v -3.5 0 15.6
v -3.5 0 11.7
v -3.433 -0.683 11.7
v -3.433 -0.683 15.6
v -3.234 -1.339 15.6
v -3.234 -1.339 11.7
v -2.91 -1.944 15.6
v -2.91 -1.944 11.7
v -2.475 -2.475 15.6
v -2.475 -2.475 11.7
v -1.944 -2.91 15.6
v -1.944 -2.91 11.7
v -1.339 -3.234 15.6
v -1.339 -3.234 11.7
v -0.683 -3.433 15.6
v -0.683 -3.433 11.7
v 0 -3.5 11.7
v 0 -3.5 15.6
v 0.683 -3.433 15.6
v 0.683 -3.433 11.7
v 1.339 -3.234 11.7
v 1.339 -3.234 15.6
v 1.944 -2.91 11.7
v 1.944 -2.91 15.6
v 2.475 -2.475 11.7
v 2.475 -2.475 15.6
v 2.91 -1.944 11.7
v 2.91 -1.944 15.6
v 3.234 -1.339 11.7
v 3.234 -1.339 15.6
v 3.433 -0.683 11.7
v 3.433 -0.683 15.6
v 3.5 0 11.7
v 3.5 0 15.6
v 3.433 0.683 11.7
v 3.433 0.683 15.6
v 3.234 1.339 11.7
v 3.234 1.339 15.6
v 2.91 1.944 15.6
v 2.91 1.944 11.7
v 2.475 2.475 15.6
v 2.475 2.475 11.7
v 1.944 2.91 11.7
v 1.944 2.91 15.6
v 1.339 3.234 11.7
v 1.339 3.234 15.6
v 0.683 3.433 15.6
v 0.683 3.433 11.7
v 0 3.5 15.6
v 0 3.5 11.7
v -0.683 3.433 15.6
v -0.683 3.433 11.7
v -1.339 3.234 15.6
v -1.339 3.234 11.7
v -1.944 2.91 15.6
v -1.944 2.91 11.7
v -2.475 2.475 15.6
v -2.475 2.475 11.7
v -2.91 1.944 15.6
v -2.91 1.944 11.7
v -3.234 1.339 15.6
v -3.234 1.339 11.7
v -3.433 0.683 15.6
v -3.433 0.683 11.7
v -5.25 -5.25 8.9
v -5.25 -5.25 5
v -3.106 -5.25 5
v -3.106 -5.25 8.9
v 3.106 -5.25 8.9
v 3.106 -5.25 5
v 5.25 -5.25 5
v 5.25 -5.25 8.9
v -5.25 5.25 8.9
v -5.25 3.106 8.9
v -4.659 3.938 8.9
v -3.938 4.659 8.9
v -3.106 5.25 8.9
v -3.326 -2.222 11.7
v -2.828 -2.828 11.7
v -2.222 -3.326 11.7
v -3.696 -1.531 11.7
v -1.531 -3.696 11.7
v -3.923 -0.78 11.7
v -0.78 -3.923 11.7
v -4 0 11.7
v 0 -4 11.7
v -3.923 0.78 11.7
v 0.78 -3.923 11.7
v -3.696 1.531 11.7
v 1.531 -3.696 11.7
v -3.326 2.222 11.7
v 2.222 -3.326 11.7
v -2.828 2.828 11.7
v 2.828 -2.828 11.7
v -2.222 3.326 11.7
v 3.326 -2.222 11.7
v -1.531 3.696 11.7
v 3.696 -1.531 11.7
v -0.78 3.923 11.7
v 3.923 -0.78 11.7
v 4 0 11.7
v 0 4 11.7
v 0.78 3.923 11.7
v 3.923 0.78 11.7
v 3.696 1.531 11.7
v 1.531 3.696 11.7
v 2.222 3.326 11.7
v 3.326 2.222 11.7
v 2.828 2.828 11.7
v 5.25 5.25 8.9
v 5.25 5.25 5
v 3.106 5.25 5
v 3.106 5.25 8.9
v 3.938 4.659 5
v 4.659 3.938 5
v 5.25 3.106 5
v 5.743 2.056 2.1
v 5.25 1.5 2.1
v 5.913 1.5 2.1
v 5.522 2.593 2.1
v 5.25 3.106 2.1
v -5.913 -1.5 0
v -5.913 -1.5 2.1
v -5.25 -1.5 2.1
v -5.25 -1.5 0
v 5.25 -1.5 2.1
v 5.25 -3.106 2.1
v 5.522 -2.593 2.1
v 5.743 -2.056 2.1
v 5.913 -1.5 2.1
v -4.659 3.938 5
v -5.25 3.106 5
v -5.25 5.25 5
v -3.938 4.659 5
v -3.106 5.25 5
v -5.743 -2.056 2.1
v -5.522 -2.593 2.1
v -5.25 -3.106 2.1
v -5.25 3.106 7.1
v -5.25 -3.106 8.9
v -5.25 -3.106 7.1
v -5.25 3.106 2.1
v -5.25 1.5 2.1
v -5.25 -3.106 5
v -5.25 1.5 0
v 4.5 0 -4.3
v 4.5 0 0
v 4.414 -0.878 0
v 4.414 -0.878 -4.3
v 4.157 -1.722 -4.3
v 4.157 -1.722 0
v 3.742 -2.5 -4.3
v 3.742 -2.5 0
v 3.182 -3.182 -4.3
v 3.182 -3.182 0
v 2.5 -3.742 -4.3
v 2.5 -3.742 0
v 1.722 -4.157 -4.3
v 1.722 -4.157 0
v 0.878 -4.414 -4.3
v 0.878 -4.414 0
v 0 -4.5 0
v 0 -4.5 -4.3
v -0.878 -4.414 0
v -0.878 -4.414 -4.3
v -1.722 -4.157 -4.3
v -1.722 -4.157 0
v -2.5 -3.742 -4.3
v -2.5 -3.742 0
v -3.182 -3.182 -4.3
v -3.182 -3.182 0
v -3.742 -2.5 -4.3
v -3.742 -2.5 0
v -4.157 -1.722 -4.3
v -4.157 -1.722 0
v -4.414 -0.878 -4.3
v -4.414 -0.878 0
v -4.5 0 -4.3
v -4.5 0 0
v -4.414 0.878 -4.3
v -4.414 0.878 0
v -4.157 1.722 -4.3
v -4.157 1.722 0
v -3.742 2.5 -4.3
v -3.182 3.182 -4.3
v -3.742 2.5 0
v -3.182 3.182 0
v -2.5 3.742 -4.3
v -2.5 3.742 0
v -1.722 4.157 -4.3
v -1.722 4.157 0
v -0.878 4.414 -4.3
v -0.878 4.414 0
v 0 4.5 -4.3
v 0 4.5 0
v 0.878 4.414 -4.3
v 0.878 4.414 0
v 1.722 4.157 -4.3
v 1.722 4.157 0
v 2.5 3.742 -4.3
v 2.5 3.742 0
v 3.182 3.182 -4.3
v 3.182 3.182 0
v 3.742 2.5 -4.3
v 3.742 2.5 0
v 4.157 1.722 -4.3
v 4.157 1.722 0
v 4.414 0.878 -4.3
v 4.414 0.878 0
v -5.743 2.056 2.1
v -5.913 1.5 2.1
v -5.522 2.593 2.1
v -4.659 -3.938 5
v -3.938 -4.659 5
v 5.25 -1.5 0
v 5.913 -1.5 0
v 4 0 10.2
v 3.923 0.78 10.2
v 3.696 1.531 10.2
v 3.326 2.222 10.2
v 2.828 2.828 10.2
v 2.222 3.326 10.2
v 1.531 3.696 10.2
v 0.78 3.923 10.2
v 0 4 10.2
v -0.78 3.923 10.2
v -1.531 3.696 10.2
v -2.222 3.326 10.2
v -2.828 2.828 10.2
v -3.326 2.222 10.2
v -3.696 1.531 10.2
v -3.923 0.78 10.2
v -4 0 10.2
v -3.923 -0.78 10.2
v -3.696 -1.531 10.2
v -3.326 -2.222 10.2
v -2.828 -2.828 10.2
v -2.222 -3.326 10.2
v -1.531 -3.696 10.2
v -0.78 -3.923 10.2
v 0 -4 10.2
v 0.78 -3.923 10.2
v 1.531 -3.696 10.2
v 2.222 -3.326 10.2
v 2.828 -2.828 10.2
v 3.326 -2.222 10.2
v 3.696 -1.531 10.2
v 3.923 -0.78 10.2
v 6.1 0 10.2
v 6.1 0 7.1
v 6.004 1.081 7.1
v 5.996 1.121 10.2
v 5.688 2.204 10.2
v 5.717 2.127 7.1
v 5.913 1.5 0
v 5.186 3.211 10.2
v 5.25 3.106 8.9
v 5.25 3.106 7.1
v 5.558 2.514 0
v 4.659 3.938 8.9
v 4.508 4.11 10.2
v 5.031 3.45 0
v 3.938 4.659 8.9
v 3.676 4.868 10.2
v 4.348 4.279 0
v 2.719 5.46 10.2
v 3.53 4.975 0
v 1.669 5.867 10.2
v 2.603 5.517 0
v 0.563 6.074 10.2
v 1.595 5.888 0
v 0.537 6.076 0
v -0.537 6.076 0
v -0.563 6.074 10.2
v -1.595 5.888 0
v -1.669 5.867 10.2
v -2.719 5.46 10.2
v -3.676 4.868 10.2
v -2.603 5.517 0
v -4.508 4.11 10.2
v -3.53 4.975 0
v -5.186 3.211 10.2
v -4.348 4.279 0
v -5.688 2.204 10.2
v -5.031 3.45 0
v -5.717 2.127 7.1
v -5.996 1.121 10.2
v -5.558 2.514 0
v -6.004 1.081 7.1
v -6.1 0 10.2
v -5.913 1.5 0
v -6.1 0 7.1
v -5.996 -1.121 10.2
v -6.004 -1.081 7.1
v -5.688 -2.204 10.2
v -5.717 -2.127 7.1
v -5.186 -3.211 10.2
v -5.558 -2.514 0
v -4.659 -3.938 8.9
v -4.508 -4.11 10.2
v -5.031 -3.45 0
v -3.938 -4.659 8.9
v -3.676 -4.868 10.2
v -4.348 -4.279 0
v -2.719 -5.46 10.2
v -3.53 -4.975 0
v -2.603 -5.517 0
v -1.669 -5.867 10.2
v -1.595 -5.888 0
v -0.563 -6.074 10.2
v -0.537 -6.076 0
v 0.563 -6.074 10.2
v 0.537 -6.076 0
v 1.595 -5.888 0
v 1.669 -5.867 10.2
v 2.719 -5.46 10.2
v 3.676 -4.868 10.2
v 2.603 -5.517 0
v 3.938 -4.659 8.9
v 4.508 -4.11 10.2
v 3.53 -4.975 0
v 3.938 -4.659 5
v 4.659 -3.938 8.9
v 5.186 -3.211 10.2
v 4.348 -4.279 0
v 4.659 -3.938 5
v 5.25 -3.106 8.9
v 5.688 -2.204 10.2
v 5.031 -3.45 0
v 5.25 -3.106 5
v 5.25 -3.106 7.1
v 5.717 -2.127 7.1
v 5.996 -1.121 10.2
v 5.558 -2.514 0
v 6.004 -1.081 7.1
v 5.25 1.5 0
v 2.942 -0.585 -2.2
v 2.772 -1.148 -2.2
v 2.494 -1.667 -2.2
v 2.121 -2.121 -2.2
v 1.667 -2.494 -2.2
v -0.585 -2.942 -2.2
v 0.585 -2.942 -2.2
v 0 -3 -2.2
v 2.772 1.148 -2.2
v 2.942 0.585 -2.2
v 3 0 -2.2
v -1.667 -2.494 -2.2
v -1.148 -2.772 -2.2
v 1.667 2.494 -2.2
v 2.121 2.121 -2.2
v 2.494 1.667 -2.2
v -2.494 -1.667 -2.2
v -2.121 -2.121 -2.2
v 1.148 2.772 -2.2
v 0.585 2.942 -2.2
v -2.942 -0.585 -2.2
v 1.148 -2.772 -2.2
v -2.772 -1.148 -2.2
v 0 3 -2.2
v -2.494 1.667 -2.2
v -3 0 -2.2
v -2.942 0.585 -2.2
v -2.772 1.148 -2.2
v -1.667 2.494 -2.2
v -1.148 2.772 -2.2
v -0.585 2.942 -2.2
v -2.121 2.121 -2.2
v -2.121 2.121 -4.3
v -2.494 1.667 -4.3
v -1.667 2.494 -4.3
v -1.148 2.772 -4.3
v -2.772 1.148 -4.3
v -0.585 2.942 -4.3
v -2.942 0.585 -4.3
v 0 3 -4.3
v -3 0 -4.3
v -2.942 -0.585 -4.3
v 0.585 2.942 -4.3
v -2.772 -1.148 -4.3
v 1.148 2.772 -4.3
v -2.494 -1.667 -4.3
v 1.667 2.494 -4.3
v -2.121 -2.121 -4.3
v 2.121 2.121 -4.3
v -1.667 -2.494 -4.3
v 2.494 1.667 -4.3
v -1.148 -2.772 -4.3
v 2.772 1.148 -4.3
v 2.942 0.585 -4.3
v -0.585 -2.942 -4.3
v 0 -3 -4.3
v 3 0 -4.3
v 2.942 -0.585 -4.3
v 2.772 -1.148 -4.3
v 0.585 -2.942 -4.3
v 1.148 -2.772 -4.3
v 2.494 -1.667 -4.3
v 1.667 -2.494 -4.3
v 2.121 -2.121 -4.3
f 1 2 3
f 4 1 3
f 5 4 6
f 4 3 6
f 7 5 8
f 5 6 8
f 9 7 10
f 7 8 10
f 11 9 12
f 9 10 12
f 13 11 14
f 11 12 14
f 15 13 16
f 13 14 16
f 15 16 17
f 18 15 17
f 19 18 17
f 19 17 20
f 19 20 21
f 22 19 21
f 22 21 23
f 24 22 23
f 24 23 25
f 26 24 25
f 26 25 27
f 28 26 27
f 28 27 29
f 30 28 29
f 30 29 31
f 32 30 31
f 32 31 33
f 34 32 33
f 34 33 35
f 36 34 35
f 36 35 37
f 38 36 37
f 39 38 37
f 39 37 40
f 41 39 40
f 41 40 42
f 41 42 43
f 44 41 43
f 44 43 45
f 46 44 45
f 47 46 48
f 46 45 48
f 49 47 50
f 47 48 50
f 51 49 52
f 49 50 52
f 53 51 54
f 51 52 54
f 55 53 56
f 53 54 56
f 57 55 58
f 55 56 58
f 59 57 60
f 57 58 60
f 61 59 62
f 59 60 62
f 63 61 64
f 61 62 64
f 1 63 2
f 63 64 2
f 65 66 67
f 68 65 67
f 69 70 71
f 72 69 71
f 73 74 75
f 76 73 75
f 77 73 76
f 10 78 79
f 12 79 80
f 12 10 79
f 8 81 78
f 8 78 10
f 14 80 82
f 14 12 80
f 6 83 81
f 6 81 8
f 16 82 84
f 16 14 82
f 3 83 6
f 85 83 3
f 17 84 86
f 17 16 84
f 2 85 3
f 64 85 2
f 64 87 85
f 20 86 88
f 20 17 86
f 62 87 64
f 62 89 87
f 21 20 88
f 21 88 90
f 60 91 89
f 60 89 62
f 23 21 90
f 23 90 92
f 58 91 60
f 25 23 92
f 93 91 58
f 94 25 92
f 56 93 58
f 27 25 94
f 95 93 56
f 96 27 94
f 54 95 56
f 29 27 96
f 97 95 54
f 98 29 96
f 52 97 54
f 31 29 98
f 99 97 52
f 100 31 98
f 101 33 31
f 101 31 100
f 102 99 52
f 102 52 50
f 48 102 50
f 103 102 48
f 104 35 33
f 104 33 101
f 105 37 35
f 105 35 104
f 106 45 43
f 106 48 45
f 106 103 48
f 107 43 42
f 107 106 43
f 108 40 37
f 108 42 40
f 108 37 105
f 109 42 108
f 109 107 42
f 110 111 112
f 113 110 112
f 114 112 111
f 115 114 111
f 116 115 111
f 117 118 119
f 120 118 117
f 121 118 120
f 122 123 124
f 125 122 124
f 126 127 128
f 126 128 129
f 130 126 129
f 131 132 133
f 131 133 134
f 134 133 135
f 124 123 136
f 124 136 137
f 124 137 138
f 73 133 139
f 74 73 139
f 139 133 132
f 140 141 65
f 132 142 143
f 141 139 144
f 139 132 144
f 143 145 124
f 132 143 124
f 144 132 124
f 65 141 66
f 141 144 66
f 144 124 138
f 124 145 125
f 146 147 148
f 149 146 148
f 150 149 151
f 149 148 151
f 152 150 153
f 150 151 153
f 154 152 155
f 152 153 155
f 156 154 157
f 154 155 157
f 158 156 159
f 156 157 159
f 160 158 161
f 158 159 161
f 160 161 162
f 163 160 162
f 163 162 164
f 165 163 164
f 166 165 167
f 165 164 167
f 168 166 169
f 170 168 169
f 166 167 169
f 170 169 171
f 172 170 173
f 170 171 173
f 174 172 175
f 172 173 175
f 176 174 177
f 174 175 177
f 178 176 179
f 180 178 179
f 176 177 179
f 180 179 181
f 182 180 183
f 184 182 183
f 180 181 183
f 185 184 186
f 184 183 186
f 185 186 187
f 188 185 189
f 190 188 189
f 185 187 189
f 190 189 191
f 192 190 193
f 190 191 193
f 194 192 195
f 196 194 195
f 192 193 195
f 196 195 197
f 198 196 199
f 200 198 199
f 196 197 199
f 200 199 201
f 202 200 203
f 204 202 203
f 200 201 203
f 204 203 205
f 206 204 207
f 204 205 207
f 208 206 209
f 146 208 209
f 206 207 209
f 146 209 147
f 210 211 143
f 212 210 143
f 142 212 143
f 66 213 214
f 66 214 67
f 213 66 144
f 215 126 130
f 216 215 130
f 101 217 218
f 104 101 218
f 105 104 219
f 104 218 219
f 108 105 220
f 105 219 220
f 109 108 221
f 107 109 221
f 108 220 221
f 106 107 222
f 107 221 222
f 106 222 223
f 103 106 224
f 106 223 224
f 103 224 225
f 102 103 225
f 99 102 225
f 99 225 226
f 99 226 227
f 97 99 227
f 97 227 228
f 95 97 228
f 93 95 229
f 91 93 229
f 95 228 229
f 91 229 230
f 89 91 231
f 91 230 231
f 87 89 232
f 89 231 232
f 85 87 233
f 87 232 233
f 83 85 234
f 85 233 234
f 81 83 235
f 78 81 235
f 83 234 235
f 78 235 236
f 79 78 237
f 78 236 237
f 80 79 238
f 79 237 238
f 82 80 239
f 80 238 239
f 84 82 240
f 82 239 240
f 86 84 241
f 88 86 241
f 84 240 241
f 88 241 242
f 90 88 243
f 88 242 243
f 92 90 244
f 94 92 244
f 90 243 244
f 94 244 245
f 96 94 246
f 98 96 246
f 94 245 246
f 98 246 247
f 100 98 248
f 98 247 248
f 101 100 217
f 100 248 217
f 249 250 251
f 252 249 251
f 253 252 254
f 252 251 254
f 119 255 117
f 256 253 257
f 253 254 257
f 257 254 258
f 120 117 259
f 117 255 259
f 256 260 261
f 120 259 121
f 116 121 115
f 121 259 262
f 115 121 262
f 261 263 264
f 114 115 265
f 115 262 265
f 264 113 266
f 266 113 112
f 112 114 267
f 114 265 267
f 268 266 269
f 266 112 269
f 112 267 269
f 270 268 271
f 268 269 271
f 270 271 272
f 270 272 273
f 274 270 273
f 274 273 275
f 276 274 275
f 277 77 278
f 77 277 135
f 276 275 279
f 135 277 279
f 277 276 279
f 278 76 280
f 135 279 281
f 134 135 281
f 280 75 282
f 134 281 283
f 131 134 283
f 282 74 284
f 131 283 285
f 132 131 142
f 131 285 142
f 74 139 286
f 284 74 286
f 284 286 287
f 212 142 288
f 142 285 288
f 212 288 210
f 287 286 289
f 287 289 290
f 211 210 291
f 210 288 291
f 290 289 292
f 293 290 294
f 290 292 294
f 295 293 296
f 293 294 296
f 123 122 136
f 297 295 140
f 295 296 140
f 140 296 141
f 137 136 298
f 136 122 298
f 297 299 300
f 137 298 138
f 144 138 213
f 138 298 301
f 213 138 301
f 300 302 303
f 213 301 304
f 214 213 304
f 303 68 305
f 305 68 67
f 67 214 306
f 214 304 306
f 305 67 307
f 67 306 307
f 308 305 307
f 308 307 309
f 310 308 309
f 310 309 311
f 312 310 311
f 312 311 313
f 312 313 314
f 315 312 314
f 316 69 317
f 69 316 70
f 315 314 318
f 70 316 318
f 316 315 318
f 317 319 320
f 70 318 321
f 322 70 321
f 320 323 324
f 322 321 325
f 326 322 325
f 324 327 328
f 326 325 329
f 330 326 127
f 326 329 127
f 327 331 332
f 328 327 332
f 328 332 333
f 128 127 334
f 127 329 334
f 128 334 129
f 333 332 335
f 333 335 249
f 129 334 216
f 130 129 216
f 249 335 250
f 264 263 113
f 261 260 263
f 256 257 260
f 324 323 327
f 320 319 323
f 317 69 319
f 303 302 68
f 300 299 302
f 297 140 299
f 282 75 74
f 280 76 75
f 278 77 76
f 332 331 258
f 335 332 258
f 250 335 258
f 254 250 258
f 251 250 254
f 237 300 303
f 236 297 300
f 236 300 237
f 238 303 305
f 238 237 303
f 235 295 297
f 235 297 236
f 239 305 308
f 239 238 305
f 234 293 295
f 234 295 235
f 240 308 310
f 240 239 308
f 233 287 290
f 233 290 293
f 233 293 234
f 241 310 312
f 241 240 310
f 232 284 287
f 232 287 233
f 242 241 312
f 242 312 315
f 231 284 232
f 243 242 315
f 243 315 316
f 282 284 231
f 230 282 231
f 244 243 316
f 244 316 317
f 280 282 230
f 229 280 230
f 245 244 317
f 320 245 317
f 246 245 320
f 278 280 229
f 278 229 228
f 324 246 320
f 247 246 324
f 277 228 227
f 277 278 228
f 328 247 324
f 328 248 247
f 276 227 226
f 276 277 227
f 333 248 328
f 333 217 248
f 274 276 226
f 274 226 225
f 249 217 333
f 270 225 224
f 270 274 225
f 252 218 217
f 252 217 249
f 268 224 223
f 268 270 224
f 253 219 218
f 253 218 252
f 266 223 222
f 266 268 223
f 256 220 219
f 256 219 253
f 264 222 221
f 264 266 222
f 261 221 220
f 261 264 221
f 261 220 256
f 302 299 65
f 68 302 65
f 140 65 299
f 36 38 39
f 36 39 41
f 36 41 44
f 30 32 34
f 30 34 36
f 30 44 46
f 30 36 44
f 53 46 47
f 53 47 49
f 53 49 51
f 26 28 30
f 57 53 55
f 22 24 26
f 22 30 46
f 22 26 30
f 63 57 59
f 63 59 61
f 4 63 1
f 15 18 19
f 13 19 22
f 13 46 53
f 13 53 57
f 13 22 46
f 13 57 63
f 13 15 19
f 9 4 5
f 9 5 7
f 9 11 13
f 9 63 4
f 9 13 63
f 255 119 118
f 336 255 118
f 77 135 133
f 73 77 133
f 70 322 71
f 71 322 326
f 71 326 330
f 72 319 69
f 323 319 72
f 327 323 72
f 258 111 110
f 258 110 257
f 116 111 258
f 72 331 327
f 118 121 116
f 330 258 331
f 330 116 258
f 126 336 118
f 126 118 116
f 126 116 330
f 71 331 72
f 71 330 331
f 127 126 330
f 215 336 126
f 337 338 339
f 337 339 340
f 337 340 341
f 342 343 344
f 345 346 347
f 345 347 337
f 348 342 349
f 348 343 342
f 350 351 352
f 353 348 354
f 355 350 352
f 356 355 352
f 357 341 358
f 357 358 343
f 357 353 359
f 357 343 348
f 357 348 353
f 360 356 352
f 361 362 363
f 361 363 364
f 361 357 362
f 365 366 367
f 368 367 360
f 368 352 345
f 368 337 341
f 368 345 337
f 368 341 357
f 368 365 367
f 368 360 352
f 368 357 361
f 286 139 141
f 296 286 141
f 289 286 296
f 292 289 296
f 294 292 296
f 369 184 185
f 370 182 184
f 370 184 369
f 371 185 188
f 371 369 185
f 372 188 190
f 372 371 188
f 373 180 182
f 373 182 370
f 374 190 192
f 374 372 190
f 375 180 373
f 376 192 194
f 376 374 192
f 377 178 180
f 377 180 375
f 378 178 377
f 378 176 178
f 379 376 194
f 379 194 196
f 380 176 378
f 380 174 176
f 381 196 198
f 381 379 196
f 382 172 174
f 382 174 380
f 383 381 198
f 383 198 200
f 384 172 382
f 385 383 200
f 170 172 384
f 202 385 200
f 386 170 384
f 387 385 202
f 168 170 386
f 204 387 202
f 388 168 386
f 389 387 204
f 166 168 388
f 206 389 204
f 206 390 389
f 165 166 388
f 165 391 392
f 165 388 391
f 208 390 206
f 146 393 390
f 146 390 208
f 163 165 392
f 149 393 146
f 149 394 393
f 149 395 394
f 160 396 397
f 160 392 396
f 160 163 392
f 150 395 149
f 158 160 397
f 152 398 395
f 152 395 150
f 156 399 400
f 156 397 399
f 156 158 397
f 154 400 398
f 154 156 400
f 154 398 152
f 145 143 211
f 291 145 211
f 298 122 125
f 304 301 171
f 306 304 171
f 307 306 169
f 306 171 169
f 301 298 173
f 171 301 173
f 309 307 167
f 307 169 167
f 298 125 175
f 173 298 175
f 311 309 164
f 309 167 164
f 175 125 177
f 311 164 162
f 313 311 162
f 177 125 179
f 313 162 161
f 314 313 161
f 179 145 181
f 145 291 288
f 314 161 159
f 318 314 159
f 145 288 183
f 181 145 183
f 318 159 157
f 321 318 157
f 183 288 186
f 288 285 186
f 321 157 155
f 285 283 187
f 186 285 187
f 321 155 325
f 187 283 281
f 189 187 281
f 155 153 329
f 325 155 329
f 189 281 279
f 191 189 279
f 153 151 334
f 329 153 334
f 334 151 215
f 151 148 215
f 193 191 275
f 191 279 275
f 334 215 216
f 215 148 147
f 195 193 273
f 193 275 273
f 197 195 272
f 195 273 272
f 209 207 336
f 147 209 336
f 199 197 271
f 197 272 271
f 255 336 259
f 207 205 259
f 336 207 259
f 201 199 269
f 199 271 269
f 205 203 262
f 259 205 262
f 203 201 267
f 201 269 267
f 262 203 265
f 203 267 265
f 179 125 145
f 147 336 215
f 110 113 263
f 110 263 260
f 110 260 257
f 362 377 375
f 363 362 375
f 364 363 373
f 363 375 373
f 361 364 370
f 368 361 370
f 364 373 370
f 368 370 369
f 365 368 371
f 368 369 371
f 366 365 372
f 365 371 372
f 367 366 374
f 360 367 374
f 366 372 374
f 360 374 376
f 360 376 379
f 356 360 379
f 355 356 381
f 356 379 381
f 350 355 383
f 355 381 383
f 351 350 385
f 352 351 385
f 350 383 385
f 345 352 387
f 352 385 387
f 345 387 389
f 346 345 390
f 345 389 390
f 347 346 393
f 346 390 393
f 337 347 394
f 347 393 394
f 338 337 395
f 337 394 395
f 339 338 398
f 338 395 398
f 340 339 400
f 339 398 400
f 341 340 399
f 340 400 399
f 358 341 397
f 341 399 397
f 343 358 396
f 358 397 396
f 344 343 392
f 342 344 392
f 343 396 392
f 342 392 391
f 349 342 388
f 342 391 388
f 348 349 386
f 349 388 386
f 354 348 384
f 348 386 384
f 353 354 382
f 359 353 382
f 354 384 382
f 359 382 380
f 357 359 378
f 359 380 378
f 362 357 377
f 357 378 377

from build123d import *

# Parameters (mm, degrees)
SKETCH_1_R          = 6.1
EXTRUDE_1_DEPTH     = 10.2
EXTRUDE_START       = 8.9
SKETCH_1_5_W        = 10.5
SKETCH_1_5_H        = 10.5
EXTRUDE_2_DEPTH     = 3.9
CUT_EXTRUDE_START   = 2.1
CUT_EXTRUDE_1_DEPTH = 5
SKETCH_3_W          = 5.6626982
SKETCH_3_H          = 3
CUT_EXTRUDE_2_DEPTH = 12.83342723
SKETCH_4_R          = 4.5
EXTRUDE_3_DEPTH     = 4.3
SKETCH_5_R          = 3
CUT_EXTRUDE_3_DEPTH = 2.1
SKETCH_6_R          = 4
SKETCH_6_R_2        = 3.5
EXTRUDE_4_DEPTH     = 1.5
SKETCH_6_2_R        = 3.5
EXTRUDE_5_DEPTH     = 5.4


with BuildPart() as part:
    # 草图1 → 凸台-拉伸1 (new body)
    with BuildSketch(Plane.XY):
        Circle(SKETCH_1_R)
    extrude(amount=EXTRUDE_1_DEPTH)

    # 草图1<5> → 凸台-拉伸2 (add)
    with BuildSketch(Plane.XY.offset(EXTRUDE_START)):
        Rectangle(SKETCH_1_5_W, SKETCH_1_5_H)
    extrude(amount=-EXTRUDE_2_DEPTH)

    # 草图1<6> → 切除-拉伸1 (cut)
    with BuildSketch(Plane.XY.offset(CUT_EXTRUDE_START)):
        with BuildLine():
            ThreePointArc((-5.25, 3.106042498), (-6.1, 0), (-5.25, -3.106042498))
            Line((-5.25, -3.106042498), (-5.25, 3.106042498))
        make_face()
        with BuildLine():
            Line((5.25, 3.106042498), (5.25, -3.106042498))
            ThreePointArc((5.25, -3.106042498), (6.1, 0), (5.25, 3.106042498))
        make_face()
    extrude(amount=CUT_EXTRUDE_1_DEPTH, mode=Mode.SUBTRACT)

    # 草图3 → 切除-拉伸2 (cut, through all)
    with BuildSketch(Plane.XY.offset(2.1)):
        with BuildLine():
            Line((5.9126982, 1.5), (5.25, 1.5))
            Line((5.25, 1.5), (5.25, -1.5))
            Line((5.25, -1.5), (5.9126982, -1.5))
            ThreePointArc((5.9126982, -1.5), (6.1, 0), (5.9126982, 1.5))
        make_face()
        with Locations((-8.0813491, 0)):
            Rectangle(SKETCH_3_W, SKETCH_3_H)
    extrude(amount=-CUT_EXTRUDE_2_DEPTH, mode=Mode.SUBTRACT)

    # 草图4 → 凸台-拉伸3 (add)
    with BuildSketch(Plane(origin=(0, 0, 0), x_dir=(-1, 0, 0), z_dir=(0, 0, -1))):
        Circle(SKETCH_4_R)
    extrude(amount=EXTRUDE_3_DEPTH)

    # 草图5 → 切除-拉伸3 (cut)
    with BuildSketch(Plane(origin=(0, 0, -4.3), x_dir=(-1, 0, 0), z_dir=(0, 0, -1))):
        Circle(SKETCH_5_R)
    extrude(amount=-CUT_EXTRUDE_3_DEPTH, mode=Mode.SUBTRACT)

    # 草图6 → 凸台-拉伸4 (add)
    with BuildSketch(Plane.XY.offset(10.2)):
        Circle(SKETCH_6_R)
        Circle(SKETCH_6_R_2, mode=Mode.SUBTRACT)
    extrude(amount=EXTRUDE_4_DEPTH)

    # 草图6<2> → 凸台-拉伸5 (add)
    with BuildSketch(Plane.XY.offset(10.2)):
        Circle(SKETCH_6_2_R)
    extrude(amount=EXTRUDE_5_DEPTH)


solid = part.part
